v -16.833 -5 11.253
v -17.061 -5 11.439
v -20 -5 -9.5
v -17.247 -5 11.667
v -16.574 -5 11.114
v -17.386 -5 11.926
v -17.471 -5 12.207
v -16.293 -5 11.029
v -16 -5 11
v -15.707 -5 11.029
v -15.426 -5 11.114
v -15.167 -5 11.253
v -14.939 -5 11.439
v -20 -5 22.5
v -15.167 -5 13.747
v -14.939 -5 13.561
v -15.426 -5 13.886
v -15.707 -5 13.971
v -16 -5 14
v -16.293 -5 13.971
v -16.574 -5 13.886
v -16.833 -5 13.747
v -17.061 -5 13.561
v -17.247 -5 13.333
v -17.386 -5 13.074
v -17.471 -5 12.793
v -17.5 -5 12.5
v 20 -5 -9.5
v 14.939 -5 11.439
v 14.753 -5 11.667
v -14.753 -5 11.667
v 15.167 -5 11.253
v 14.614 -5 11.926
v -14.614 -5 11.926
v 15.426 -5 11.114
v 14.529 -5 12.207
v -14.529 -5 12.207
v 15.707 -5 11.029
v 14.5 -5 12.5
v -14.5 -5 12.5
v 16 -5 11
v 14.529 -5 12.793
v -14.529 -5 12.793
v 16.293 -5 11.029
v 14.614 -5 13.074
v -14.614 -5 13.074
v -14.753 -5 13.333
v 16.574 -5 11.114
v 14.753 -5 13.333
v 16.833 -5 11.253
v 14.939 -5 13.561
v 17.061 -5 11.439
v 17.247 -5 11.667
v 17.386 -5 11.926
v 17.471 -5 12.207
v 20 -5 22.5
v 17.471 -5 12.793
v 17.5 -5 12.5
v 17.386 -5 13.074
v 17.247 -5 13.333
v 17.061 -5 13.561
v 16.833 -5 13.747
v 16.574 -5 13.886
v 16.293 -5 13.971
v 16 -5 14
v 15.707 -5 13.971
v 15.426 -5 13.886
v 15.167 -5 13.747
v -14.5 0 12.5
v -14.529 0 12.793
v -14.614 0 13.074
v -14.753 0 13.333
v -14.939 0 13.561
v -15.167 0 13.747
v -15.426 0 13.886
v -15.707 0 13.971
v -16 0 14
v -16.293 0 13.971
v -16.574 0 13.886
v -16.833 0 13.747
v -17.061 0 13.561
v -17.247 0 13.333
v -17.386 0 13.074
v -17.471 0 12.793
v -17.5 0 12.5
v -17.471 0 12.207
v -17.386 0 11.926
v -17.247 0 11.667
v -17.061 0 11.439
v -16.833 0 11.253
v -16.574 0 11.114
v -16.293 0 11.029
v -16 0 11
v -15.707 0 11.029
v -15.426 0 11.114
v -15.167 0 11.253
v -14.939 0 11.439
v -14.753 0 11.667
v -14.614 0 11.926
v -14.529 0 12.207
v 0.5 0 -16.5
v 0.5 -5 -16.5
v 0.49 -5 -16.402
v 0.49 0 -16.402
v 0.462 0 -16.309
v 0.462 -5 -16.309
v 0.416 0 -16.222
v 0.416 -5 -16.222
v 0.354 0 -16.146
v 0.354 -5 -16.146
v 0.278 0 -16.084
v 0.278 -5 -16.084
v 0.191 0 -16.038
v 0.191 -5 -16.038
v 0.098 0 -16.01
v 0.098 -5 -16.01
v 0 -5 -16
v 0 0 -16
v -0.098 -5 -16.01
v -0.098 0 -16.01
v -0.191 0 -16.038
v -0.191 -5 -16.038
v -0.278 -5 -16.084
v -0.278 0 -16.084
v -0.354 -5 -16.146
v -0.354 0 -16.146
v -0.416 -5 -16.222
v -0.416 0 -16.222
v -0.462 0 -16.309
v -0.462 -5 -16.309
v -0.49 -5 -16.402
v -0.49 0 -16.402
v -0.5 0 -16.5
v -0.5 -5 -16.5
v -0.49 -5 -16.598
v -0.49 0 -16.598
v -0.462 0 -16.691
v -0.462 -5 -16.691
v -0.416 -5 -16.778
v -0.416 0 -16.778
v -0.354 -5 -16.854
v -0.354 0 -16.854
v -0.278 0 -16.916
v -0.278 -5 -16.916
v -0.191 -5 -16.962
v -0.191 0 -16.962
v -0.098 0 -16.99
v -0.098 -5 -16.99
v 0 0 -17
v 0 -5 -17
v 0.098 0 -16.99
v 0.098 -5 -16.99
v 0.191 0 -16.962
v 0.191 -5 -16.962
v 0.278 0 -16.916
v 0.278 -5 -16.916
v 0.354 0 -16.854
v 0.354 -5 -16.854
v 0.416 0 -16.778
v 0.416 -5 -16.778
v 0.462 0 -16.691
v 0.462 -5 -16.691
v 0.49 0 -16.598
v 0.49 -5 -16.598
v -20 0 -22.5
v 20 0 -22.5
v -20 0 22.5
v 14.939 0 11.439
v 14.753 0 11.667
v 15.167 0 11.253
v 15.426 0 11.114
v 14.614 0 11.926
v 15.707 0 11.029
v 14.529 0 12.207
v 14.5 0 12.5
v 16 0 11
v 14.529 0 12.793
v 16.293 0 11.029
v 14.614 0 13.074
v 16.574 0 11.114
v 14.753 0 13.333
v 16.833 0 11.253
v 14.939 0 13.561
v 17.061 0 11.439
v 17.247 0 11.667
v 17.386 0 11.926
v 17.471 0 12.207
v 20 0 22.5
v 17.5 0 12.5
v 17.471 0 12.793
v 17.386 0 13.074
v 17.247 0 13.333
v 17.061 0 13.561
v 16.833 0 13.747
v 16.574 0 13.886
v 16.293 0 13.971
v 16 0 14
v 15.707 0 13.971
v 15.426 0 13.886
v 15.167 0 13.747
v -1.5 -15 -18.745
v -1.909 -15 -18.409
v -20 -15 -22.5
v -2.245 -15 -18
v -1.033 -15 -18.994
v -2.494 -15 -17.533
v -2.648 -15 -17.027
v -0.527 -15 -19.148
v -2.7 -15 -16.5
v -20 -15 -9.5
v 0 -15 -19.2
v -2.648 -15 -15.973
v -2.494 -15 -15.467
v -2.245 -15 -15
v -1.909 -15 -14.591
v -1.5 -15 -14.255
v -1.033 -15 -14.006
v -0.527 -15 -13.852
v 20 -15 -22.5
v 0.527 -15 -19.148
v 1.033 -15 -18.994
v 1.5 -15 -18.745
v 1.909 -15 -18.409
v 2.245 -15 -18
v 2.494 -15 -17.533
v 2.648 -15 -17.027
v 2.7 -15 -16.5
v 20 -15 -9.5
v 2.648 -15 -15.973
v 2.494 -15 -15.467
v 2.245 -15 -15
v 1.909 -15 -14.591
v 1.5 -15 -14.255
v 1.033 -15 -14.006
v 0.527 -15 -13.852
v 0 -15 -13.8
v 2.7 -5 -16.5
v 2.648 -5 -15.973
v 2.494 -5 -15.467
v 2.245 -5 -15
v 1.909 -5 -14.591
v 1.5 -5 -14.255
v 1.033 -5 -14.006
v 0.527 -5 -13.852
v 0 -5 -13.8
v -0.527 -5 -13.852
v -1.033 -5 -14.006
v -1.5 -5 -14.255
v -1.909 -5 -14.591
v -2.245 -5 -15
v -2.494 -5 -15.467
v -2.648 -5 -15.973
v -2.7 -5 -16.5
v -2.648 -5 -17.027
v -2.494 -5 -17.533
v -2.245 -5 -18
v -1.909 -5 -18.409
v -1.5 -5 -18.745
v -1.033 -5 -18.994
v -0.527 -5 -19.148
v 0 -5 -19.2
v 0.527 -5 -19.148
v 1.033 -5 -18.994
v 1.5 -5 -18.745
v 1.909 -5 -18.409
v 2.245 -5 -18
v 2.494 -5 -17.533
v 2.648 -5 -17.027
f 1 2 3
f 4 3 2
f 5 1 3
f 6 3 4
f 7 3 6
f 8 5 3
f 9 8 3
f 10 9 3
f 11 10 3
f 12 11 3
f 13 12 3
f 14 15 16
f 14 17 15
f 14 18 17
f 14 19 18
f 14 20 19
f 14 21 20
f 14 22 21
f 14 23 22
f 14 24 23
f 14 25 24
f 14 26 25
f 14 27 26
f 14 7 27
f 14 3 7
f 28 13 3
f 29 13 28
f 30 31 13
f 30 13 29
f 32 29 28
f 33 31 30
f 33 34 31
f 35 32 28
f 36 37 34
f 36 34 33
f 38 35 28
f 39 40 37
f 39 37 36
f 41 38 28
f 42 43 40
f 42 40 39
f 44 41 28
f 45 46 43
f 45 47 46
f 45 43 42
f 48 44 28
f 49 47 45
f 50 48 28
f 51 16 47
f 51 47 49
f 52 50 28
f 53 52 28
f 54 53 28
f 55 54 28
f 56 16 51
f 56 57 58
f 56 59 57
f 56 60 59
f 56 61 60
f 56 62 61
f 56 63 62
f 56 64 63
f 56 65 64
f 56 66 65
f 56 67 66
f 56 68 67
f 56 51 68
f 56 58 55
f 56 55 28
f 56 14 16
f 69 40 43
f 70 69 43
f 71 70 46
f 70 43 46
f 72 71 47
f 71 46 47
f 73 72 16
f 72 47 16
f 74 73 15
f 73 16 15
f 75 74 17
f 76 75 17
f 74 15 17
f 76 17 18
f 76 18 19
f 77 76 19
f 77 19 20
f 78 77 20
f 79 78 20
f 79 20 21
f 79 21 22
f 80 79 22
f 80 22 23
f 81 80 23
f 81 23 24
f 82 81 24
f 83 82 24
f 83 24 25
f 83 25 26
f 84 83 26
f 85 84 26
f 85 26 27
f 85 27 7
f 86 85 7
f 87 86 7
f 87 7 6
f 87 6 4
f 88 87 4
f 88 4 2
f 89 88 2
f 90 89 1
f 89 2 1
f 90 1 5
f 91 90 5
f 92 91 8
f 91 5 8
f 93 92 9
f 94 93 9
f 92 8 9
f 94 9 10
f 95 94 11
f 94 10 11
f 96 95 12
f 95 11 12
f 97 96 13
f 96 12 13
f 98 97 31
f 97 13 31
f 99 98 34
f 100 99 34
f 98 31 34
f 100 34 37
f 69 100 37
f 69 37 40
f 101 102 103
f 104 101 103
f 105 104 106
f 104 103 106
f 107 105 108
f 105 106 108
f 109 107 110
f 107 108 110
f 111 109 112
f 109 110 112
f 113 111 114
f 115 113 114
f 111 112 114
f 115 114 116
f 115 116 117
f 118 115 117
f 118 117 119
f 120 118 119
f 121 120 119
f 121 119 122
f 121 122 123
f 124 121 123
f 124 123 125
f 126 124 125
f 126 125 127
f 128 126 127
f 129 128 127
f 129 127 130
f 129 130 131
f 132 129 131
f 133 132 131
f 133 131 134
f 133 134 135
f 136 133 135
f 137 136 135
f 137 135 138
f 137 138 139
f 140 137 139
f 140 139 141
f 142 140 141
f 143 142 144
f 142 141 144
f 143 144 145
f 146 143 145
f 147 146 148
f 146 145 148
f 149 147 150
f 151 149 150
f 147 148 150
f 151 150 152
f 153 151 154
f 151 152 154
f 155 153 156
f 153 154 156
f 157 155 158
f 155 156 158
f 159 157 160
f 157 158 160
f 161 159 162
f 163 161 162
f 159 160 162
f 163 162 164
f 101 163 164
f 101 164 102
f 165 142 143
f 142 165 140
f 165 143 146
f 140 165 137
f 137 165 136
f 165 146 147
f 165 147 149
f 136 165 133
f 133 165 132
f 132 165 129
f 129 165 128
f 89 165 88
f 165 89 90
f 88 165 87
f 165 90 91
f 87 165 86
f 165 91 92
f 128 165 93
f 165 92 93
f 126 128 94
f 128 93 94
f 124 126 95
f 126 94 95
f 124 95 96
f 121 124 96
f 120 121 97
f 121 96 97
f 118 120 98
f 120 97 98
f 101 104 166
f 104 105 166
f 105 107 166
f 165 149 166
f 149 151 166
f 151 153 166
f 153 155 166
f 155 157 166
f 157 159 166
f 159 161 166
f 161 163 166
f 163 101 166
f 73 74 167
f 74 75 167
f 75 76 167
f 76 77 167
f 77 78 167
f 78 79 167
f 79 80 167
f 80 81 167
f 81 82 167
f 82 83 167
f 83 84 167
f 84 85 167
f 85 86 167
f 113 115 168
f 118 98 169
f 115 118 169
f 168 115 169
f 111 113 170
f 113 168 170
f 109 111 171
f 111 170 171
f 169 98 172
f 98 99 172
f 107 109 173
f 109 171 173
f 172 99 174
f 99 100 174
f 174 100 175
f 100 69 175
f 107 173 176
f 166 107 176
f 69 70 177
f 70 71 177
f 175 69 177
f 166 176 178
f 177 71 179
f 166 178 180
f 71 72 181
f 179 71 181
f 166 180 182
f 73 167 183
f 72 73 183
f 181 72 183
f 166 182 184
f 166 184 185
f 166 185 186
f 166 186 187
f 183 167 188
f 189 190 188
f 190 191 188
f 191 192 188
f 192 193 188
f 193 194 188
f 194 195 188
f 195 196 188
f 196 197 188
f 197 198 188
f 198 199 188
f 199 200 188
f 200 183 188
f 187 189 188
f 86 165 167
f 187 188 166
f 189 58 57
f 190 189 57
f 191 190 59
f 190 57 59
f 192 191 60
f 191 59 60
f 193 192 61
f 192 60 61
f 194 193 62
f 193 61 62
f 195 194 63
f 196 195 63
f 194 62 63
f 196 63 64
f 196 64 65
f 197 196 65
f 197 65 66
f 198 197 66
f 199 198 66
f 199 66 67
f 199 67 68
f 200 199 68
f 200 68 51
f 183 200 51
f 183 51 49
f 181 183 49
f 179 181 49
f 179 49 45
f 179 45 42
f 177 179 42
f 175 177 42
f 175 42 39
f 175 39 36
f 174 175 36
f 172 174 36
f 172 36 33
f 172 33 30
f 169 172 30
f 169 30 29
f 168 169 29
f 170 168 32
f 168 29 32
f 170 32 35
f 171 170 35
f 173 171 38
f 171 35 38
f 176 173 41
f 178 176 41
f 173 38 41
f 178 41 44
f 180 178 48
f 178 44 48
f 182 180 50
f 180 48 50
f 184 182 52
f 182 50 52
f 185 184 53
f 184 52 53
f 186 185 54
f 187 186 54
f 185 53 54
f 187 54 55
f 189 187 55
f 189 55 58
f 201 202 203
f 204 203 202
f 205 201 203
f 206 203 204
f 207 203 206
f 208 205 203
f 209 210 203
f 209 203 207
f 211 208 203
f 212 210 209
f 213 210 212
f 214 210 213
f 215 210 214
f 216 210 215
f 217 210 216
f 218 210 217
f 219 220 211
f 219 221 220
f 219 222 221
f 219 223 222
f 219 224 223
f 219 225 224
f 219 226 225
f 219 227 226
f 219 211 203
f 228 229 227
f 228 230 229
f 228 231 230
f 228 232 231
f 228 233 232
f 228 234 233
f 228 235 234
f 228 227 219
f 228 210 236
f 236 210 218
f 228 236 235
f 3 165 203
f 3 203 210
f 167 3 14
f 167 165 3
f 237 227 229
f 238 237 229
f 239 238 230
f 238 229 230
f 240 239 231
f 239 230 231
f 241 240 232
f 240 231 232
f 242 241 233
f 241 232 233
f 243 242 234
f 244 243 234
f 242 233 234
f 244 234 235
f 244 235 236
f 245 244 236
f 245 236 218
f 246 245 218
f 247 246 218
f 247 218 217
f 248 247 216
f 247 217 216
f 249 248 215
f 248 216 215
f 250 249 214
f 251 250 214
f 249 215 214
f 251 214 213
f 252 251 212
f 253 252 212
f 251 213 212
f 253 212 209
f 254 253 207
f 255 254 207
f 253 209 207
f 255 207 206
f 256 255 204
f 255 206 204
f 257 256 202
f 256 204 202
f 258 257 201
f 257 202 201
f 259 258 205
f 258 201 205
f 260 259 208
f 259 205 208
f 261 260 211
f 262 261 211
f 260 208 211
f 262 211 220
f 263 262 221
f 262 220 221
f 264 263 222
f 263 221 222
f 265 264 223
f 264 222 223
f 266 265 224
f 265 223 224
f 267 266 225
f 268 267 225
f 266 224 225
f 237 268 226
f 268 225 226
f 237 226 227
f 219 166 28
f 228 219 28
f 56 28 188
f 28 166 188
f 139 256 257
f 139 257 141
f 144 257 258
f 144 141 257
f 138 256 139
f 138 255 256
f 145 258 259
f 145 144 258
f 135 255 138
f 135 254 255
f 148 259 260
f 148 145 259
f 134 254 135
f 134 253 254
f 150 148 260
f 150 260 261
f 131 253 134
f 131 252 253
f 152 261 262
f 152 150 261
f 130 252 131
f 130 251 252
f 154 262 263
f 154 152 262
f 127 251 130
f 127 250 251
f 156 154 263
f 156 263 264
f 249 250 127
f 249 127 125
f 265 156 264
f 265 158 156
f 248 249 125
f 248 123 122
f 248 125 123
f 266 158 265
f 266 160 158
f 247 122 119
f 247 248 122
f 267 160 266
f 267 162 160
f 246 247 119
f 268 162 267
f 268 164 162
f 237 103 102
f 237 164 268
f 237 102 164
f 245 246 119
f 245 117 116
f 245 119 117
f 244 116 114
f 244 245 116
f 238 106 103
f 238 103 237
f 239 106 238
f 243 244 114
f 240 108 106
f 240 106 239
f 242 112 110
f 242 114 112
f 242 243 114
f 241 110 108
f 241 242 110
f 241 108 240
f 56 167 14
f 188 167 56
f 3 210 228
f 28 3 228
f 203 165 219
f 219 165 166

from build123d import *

# Parameters (mm, degrees)
F0_W      = 40
F0_H      = 45
F1_DEPTH  = 15
F2_R      = 1.5
F3_DEPTH  = 25
F7_R      = 2.7
F8_DEPTH  = 10
F9_W      = 40
F9_H      = 32
F10_DEPTH = 10
F11_R     = 0.5
F12_DEPTH = 15


with BuildPart() as f1:
    # F0 (on Front) → F1 (new body)
    with BuildSketch(Plane.XZ):
        Rectangle(F0_W, F0_H)
    extrude(amount=F1_DEPTH)

    # F2 (on face) → F3 (cut)
    with BuildSketch(Plane.XZ.offset(15)):
        with Locations((16, 12.5)):
            Circle(F2_R)
        with Locations((-16, 12.5)):
            Circle(F2_R)
    extrude(amount=-F3_DEPTH, mode=Mode.SUBTRACT)

    # F7 (on face) → F8 (cut)
    with BuildSketch(Plane.XZ.offset(15)):
        with Locations((0, -16.5)):
            Circle(F7_R)
    extrude(amount=-F8_DEPTH, mode=Mode.SUBTRACT)

    # F9 (on face) → F10 (cut)
    with BuildSketch(Plane.XZ.offset(15)):
        with Locations((0, 6.5)):
            Rectangle(F9_W, F9_H)
    extrude(amount=-F10_DEPTH, mode=Mode.SUBTRACT)

    # F11 (on face) → F12 (cut)
    with BuildSketch(Plane.XZ.offset(15)):
        with Locations((0, -16.5)):
            Circle(F11_R)
    extrude(amount=-F12_DEPTH, mode=Mode.SUBTRACT)


solid = f1.part
